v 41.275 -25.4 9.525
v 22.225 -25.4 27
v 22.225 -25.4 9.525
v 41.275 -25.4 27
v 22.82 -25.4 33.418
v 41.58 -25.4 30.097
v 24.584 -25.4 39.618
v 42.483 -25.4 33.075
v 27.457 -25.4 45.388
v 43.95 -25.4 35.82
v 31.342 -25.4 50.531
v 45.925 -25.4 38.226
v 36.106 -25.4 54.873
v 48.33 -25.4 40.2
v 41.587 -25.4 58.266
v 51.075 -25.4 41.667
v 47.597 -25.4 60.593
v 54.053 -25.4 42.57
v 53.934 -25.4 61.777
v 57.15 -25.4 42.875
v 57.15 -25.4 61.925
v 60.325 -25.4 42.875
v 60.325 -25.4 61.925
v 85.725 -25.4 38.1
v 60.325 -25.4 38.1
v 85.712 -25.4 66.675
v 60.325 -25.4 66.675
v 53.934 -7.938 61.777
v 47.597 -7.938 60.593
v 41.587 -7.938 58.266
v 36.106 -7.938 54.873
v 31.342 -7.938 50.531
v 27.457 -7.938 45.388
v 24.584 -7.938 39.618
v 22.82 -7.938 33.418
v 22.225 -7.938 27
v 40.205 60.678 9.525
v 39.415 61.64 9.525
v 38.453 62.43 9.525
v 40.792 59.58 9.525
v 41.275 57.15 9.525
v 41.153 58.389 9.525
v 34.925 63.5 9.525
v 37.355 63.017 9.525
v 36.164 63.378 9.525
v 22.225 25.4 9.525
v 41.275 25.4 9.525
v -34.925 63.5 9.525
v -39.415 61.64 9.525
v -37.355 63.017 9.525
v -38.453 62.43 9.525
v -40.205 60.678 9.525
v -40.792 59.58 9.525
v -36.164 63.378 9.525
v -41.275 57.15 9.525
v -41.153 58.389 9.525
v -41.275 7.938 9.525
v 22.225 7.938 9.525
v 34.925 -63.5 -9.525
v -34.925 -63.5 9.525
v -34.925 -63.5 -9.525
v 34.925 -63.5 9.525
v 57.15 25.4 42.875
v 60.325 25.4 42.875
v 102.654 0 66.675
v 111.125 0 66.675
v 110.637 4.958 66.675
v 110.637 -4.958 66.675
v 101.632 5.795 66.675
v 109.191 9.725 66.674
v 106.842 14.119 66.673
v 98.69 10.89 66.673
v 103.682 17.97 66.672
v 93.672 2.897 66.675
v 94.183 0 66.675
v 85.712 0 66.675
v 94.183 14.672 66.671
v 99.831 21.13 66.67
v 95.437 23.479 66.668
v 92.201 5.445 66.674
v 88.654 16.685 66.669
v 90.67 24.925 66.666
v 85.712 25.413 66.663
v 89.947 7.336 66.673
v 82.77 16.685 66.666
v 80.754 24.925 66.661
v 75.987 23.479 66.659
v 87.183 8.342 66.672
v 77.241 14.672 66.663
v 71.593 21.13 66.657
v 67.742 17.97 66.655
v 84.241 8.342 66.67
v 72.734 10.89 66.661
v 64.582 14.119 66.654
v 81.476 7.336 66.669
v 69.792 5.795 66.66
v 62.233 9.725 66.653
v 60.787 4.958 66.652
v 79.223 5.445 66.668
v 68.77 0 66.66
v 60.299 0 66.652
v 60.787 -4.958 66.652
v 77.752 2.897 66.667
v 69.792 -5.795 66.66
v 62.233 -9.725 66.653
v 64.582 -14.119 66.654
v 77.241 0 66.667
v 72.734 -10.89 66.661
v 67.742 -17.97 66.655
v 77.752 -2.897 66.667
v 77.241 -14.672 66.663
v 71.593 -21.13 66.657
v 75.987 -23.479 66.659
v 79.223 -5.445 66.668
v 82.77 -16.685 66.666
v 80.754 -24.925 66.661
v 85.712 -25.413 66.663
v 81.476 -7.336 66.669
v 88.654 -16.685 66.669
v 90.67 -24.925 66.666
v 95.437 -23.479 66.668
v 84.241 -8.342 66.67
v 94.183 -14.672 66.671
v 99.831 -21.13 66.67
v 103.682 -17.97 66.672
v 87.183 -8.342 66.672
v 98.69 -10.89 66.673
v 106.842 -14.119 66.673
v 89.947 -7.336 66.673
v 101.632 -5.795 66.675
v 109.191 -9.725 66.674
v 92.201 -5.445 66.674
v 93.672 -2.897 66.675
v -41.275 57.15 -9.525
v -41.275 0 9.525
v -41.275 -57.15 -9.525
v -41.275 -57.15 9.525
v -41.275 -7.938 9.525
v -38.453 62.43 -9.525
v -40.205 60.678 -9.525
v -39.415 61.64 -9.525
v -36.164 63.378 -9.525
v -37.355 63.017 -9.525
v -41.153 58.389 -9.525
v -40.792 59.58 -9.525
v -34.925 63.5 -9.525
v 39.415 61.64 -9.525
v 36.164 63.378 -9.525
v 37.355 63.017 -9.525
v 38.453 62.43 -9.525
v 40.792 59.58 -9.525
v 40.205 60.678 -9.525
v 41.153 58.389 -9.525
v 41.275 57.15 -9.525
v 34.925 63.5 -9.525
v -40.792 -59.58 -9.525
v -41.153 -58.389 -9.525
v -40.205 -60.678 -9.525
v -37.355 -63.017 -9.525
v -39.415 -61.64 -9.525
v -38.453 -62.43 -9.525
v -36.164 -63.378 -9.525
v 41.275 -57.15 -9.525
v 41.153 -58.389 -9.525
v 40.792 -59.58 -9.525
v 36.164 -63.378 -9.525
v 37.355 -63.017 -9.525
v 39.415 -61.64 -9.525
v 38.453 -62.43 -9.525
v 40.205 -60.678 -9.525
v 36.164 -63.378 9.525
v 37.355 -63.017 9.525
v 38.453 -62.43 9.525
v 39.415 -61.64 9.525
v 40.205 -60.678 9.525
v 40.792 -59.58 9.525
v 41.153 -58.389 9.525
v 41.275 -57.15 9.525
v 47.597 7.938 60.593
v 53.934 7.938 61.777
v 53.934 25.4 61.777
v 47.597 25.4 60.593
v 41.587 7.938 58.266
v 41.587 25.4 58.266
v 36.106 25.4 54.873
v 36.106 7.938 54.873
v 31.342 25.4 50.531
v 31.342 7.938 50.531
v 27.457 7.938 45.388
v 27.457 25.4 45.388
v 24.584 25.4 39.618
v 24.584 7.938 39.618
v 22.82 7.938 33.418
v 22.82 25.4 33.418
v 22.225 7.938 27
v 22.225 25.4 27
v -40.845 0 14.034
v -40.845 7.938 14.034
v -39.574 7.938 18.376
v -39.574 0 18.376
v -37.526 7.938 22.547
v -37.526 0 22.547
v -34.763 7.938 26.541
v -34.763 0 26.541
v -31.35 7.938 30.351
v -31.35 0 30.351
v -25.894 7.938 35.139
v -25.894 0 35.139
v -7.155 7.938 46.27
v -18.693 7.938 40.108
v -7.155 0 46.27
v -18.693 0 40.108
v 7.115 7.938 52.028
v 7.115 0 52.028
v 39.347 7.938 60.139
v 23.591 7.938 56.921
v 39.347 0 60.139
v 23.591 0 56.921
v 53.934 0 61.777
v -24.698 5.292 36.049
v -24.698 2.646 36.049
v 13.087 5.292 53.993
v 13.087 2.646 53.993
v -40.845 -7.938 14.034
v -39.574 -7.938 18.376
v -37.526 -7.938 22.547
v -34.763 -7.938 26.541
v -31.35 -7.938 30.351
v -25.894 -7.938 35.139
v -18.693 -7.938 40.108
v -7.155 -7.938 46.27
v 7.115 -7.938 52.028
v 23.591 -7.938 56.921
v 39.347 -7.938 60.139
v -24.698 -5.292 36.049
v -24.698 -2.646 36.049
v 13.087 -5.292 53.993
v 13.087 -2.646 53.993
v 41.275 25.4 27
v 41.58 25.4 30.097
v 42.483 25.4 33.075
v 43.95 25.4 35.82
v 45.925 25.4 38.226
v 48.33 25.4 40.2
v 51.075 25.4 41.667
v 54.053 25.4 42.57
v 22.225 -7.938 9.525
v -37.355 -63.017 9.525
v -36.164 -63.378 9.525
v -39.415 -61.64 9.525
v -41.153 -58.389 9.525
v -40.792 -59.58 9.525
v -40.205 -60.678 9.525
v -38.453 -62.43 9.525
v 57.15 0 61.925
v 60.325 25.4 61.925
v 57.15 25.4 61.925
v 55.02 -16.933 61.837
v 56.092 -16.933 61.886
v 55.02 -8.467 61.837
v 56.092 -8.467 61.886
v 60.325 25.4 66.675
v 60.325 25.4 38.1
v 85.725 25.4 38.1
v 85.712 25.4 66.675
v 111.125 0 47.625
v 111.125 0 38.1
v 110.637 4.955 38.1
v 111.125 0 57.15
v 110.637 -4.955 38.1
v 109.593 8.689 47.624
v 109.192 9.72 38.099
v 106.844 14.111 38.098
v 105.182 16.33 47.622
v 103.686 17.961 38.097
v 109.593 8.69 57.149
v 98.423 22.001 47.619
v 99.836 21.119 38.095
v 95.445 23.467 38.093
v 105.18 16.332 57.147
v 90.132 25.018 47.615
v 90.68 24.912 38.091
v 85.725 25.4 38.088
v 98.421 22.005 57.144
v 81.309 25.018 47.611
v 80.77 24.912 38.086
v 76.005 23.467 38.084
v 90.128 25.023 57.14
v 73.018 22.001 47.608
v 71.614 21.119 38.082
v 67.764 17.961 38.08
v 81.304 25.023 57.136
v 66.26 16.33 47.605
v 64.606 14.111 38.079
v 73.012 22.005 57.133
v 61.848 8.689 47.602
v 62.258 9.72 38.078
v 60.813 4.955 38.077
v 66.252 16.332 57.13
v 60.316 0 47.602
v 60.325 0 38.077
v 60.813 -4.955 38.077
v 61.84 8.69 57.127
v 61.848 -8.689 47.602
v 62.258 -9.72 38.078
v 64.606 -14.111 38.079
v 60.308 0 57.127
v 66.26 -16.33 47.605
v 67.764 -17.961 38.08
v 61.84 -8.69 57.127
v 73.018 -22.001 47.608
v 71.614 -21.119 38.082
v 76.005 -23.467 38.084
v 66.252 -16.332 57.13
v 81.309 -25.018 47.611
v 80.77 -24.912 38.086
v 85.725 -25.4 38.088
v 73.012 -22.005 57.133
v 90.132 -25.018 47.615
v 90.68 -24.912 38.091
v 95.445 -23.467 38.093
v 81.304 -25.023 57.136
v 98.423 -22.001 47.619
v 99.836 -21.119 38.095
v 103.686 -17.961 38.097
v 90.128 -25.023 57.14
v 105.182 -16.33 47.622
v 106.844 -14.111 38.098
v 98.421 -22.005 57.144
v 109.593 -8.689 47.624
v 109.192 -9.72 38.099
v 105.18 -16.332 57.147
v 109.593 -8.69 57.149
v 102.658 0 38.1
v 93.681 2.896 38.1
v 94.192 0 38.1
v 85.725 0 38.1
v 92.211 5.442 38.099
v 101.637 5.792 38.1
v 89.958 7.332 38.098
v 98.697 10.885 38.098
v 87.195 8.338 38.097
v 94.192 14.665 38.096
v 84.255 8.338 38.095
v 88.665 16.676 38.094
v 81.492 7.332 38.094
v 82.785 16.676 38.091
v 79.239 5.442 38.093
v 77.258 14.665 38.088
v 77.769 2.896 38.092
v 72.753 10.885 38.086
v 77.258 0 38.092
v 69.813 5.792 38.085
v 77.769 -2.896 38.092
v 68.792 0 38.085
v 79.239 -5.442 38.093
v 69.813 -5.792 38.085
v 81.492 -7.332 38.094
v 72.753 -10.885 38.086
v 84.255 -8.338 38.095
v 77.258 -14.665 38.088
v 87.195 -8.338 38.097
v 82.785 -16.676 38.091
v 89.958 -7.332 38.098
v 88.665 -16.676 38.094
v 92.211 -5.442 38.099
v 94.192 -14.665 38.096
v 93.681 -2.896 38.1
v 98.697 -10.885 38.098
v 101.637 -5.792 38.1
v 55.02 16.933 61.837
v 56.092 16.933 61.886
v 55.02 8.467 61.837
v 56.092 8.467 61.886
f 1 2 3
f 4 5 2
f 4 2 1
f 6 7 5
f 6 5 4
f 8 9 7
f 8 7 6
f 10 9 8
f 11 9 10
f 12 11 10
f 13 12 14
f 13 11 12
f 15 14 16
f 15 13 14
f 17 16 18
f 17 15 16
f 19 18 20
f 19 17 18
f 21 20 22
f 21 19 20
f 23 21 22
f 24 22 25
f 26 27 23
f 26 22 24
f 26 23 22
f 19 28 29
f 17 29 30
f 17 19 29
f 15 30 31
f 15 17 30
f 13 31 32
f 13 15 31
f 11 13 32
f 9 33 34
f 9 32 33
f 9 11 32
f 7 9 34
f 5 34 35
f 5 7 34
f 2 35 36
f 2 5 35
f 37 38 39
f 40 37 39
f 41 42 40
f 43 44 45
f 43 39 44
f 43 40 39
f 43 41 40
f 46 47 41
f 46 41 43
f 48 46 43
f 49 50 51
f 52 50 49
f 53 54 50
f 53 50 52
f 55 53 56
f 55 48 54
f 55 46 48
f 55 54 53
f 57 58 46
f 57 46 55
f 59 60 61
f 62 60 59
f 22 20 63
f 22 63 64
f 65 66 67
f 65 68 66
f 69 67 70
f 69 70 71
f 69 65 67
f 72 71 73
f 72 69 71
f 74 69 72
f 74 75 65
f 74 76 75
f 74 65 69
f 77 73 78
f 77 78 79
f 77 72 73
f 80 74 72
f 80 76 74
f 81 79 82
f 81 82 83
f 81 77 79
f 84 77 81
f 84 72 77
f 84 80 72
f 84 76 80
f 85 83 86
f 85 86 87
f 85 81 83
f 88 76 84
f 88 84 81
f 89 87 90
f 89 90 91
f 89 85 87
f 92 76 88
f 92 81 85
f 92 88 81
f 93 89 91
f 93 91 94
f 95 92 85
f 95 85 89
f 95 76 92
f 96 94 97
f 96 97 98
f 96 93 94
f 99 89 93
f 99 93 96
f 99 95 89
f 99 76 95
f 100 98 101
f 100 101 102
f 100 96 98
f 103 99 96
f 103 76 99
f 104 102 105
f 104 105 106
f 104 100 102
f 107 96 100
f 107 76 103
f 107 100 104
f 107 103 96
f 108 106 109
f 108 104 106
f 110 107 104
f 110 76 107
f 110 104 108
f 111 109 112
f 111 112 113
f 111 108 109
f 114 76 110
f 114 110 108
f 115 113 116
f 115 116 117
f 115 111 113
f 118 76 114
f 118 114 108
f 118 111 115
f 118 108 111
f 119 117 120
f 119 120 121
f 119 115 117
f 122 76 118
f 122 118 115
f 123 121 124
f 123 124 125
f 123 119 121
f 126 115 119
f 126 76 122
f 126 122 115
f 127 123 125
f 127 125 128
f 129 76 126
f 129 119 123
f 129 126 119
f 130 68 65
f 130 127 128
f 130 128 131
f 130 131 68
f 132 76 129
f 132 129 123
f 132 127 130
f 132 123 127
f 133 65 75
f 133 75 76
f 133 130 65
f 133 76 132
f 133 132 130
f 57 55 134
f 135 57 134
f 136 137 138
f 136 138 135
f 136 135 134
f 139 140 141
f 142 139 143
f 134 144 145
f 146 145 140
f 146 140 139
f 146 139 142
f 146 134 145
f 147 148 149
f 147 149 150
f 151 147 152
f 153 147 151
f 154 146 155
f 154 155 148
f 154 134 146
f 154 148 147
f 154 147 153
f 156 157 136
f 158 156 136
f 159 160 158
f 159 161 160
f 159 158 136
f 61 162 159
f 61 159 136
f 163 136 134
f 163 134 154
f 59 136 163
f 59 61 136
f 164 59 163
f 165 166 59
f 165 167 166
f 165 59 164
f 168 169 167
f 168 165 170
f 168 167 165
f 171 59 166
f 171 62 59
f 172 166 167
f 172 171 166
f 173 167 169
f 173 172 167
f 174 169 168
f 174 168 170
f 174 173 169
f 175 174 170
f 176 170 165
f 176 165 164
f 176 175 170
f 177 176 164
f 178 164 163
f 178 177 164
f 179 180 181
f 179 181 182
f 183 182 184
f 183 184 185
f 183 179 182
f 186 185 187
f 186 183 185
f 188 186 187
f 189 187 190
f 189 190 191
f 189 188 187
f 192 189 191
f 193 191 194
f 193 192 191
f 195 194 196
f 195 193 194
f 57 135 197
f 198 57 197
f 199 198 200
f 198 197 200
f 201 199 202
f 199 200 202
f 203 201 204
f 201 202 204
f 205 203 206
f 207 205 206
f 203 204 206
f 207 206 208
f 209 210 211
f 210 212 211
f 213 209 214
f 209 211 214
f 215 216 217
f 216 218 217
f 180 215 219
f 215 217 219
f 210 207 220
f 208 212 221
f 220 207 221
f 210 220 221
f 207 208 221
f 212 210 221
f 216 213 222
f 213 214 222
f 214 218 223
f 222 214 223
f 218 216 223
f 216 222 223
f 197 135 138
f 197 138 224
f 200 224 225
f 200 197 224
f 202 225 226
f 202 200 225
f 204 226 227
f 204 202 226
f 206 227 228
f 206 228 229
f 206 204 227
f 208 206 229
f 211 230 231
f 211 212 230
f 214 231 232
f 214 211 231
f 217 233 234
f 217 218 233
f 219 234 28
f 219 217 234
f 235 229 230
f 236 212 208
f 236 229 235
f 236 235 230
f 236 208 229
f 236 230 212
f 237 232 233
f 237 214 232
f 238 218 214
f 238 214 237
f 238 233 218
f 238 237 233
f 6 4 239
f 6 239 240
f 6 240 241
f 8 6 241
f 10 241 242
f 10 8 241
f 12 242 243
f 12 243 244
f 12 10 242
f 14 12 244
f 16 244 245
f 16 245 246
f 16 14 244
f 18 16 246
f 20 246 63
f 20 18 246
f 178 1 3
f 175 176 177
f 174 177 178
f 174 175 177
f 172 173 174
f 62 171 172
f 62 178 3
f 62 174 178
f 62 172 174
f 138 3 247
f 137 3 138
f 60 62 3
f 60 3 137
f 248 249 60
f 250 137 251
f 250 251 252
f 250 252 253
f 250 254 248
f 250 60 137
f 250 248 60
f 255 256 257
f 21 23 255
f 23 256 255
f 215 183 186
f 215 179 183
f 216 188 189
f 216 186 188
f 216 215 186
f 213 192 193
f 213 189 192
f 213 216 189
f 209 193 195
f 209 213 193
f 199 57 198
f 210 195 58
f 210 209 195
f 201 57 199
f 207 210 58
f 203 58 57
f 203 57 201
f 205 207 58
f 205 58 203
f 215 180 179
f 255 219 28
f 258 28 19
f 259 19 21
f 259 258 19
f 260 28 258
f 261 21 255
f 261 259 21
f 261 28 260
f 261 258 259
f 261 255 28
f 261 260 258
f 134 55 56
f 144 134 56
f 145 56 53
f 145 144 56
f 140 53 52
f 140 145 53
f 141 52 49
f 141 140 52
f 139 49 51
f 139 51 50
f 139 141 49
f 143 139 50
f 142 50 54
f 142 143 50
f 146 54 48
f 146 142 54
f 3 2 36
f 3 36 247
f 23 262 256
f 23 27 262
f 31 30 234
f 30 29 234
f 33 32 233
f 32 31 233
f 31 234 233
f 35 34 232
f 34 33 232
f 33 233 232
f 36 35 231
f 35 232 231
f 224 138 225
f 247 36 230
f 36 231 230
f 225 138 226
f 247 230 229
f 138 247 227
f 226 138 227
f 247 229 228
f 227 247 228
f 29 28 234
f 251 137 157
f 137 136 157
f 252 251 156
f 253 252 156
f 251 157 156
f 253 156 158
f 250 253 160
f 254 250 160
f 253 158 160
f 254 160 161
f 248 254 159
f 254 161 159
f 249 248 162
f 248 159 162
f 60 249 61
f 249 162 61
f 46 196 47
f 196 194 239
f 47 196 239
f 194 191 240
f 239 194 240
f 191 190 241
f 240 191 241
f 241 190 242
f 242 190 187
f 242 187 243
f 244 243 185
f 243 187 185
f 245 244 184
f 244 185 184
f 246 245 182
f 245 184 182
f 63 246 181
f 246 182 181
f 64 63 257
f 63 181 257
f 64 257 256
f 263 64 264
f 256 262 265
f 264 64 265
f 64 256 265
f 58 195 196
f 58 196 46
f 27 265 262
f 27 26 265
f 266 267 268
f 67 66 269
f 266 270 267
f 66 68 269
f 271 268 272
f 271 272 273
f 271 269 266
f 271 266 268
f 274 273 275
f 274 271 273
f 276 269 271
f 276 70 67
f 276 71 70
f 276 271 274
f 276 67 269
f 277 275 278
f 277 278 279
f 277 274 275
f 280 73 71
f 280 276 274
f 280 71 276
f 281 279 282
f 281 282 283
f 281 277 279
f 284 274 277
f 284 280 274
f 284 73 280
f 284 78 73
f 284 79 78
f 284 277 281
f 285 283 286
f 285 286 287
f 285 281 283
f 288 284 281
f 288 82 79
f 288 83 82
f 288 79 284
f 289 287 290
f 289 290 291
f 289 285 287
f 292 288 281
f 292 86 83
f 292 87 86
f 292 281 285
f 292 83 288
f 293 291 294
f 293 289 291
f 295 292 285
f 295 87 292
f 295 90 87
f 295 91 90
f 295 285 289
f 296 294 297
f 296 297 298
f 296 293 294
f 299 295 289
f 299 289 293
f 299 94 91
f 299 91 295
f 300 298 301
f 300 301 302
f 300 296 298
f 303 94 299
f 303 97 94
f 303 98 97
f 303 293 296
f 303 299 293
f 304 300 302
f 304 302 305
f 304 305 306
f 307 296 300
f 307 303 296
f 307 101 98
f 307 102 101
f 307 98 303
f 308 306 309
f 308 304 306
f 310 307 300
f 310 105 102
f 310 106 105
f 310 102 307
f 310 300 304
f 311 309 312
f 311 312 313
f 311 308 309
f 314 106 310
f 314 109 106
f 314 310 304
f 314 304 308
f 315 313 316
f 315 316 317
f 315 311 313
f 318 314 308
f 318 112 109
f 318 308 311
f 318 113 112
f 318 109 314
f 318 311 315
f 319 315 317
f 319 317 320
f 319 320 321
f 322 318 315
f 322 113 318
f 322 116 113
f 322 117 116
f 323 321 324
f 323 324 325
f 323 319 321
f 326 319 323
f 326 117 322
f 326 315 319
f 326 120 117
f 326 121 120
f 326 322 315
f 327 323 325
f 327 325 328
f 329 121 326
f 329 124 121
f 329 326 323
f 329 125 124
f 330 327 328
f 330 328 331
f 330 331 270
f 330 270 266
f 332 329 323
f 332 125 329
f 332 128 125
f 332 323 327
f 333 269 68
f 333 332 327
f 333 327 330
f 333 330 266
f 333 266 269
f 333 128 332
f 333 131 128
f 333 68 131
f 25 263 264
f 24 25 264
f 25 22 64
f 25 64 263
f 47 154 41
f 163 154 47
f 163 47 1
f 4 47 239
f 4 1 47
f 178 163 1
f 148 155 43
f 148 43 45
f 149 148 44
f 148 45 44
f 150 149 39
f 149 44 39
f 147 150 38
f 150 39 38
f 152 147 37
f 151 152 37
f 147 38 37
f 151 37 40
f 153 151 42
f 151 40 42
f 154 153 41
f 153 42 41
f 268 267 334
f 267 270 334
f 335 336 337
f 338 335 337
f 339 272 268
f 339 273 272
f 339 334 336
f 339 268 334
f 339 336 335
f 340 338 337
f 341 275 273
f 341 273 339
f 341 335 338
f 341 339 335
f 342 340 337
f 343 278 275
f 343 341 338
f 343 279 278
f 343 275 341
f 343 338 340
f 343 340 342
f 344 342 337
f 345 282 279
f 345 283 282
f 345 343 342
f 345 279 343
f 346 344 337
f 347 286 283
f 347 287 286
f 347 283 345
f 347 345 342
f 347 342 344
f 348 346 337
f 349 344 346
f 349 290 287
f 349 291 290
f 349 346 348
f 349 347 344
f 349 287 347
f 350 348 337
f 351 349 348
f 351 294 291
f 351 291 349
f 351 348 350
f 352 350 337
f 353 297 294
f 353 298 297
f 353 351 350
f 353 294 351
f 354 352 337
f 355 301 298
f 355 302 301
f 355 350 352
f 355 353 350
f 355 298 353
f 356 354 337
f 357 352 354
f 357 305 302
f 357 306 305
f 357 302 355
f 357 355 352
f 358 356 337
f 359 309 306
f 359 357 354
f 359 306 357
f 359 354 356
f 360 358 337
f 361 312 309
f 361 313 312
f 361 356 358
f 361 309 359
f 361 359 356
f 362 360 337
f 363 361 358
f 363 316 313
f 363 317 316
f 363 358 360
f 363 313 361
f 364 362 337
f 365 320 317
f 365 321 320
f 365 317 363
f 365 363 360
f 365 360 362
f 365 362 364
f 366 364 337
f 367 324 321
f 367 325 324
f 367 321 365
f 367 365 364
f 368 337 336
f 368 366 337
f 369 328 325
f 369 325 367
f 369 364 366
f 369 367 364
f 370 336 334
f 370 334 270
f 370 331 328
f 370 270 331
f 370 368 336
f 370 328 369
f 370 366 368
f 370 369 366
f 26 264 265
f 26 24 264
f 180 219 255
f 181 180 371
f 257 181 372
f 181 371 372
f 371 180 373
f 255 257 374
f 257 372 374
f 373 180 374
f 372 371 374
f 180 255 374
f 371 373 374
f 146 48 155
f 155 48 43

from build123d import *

# Parameters (mm, degrees)
F1_DEPTH = 63.5
F2_DEPTH = 25.4
F3_DEPTH = 7.9375
F5_R     = 6.35


with BuildPart() as f1:
    # F0 (on Front) → F1 (new body, symmetric)
    with BuildSketch(Plane.XZ):
        Polygon((22.225, 9.525), (-41.275, 9.525), (-41.275, -9.525), (41.275, -9.525), (41.275, 9.525), align=None)
    extrude(amount=F1_DEPTH, both=True)

    # F0 (on Front) → F2 (join, symmetric)
    with BuildSketch(Plane.XZ):
        Polygon((60.325, 66.675), (60.325, 61.9252), (60.325, 42.8752), (60.325, 38.1), (85.725, 38.1), (85.7119485736, 66.675), align=None)
        with BuildLine():
            Line((22.225, 27.0002), (22.225, 9.525))
            Line((22.225, 9.525), (41.275, 9.525))
            Line((41.275, 9.525), (41.275, 27.0002))
            ThreePointArc((41.275, 27.0002), (45.9246798487, 38.2255201513), (57.15, 42.8752))
            Line((57.15, 42.8752), (60.325, 42.8752))
            Line((60.325, 42.8752), (60.325, 61.9252))
            Line((60.325, 61.9252), (57.15, 61.9252))
            add(Edge.make_bspline(
                [(53.9335842921, 61.7767768154), (55.0269644588, 61.8422704469), (56.0998451994, 61.891809488), (57.15, 61.9252)],
                knots=[108.2465498162, 108.2465498162, 108.2465498162, 108.2465498162, 111.5045361635, 111.5045361635, 111.5045361635, 111.5045361635], degree=3))
            ThreePointArc((53.9335842921, 61.7767768154), (31.3421625897, 50.5312678296), (22.225, 27.0002))
        make_face()
    extrude(amount=F2_DEPTH, both=True)

    # F0 (on Front) → F3 (join, symmetric)
    with BuildSketch(Plane.XZ):
        with BuildLine():
            add(Edge.make_bspline(
                [(-41.275, 9.525), (-41.350806268, 39.8124596895), (17.6060438856, 59.6007518438), (53.9335842921, 61.7767768154)],
                knots=[0, 0, 0, 0, 108.2465498162, 108.2465498162, 108.2465498162, 108.2465498162], degree=3))
            Line((-41.275, 9.525), (22.225, 9.525))
            Line((22.225, 9.525), (22.225, 27.0002))
            ThreePointArc((22.225, 27.0002), (31.3421625897, 50.5312678296), (53.9335842921, 61.7767768154))
        make_face()
    extrude(amount=F3_DEPTH, both=True)

    # F5
    f5_edges = [f1.edges().sort_by_distance(p)[0] for p in [
        (41.275, -63.5, 0),
        (-41.275, -63.5, 0),
        (41.275, 63.5, 0),
        (-41.275, 63.5, 0),
    ]]
    fillet(f5_edges, radius=F5_R)


with BuildPart() as f4:
    # F0 (on Front) → F4 (revolve)
    with BuildSketch(Plane.XZ):
        Polygon((111.125, 66.675), (85.7119485736, 66.675), (85.725, 38.1), (111.125, 38.1), align=None)
    revolve(axis=Axis((85.7184742868, 0, 52.3875), (-0.0004567428, 0, 0.9999998957)))


solid = Compound([f1.part, f4.part])
